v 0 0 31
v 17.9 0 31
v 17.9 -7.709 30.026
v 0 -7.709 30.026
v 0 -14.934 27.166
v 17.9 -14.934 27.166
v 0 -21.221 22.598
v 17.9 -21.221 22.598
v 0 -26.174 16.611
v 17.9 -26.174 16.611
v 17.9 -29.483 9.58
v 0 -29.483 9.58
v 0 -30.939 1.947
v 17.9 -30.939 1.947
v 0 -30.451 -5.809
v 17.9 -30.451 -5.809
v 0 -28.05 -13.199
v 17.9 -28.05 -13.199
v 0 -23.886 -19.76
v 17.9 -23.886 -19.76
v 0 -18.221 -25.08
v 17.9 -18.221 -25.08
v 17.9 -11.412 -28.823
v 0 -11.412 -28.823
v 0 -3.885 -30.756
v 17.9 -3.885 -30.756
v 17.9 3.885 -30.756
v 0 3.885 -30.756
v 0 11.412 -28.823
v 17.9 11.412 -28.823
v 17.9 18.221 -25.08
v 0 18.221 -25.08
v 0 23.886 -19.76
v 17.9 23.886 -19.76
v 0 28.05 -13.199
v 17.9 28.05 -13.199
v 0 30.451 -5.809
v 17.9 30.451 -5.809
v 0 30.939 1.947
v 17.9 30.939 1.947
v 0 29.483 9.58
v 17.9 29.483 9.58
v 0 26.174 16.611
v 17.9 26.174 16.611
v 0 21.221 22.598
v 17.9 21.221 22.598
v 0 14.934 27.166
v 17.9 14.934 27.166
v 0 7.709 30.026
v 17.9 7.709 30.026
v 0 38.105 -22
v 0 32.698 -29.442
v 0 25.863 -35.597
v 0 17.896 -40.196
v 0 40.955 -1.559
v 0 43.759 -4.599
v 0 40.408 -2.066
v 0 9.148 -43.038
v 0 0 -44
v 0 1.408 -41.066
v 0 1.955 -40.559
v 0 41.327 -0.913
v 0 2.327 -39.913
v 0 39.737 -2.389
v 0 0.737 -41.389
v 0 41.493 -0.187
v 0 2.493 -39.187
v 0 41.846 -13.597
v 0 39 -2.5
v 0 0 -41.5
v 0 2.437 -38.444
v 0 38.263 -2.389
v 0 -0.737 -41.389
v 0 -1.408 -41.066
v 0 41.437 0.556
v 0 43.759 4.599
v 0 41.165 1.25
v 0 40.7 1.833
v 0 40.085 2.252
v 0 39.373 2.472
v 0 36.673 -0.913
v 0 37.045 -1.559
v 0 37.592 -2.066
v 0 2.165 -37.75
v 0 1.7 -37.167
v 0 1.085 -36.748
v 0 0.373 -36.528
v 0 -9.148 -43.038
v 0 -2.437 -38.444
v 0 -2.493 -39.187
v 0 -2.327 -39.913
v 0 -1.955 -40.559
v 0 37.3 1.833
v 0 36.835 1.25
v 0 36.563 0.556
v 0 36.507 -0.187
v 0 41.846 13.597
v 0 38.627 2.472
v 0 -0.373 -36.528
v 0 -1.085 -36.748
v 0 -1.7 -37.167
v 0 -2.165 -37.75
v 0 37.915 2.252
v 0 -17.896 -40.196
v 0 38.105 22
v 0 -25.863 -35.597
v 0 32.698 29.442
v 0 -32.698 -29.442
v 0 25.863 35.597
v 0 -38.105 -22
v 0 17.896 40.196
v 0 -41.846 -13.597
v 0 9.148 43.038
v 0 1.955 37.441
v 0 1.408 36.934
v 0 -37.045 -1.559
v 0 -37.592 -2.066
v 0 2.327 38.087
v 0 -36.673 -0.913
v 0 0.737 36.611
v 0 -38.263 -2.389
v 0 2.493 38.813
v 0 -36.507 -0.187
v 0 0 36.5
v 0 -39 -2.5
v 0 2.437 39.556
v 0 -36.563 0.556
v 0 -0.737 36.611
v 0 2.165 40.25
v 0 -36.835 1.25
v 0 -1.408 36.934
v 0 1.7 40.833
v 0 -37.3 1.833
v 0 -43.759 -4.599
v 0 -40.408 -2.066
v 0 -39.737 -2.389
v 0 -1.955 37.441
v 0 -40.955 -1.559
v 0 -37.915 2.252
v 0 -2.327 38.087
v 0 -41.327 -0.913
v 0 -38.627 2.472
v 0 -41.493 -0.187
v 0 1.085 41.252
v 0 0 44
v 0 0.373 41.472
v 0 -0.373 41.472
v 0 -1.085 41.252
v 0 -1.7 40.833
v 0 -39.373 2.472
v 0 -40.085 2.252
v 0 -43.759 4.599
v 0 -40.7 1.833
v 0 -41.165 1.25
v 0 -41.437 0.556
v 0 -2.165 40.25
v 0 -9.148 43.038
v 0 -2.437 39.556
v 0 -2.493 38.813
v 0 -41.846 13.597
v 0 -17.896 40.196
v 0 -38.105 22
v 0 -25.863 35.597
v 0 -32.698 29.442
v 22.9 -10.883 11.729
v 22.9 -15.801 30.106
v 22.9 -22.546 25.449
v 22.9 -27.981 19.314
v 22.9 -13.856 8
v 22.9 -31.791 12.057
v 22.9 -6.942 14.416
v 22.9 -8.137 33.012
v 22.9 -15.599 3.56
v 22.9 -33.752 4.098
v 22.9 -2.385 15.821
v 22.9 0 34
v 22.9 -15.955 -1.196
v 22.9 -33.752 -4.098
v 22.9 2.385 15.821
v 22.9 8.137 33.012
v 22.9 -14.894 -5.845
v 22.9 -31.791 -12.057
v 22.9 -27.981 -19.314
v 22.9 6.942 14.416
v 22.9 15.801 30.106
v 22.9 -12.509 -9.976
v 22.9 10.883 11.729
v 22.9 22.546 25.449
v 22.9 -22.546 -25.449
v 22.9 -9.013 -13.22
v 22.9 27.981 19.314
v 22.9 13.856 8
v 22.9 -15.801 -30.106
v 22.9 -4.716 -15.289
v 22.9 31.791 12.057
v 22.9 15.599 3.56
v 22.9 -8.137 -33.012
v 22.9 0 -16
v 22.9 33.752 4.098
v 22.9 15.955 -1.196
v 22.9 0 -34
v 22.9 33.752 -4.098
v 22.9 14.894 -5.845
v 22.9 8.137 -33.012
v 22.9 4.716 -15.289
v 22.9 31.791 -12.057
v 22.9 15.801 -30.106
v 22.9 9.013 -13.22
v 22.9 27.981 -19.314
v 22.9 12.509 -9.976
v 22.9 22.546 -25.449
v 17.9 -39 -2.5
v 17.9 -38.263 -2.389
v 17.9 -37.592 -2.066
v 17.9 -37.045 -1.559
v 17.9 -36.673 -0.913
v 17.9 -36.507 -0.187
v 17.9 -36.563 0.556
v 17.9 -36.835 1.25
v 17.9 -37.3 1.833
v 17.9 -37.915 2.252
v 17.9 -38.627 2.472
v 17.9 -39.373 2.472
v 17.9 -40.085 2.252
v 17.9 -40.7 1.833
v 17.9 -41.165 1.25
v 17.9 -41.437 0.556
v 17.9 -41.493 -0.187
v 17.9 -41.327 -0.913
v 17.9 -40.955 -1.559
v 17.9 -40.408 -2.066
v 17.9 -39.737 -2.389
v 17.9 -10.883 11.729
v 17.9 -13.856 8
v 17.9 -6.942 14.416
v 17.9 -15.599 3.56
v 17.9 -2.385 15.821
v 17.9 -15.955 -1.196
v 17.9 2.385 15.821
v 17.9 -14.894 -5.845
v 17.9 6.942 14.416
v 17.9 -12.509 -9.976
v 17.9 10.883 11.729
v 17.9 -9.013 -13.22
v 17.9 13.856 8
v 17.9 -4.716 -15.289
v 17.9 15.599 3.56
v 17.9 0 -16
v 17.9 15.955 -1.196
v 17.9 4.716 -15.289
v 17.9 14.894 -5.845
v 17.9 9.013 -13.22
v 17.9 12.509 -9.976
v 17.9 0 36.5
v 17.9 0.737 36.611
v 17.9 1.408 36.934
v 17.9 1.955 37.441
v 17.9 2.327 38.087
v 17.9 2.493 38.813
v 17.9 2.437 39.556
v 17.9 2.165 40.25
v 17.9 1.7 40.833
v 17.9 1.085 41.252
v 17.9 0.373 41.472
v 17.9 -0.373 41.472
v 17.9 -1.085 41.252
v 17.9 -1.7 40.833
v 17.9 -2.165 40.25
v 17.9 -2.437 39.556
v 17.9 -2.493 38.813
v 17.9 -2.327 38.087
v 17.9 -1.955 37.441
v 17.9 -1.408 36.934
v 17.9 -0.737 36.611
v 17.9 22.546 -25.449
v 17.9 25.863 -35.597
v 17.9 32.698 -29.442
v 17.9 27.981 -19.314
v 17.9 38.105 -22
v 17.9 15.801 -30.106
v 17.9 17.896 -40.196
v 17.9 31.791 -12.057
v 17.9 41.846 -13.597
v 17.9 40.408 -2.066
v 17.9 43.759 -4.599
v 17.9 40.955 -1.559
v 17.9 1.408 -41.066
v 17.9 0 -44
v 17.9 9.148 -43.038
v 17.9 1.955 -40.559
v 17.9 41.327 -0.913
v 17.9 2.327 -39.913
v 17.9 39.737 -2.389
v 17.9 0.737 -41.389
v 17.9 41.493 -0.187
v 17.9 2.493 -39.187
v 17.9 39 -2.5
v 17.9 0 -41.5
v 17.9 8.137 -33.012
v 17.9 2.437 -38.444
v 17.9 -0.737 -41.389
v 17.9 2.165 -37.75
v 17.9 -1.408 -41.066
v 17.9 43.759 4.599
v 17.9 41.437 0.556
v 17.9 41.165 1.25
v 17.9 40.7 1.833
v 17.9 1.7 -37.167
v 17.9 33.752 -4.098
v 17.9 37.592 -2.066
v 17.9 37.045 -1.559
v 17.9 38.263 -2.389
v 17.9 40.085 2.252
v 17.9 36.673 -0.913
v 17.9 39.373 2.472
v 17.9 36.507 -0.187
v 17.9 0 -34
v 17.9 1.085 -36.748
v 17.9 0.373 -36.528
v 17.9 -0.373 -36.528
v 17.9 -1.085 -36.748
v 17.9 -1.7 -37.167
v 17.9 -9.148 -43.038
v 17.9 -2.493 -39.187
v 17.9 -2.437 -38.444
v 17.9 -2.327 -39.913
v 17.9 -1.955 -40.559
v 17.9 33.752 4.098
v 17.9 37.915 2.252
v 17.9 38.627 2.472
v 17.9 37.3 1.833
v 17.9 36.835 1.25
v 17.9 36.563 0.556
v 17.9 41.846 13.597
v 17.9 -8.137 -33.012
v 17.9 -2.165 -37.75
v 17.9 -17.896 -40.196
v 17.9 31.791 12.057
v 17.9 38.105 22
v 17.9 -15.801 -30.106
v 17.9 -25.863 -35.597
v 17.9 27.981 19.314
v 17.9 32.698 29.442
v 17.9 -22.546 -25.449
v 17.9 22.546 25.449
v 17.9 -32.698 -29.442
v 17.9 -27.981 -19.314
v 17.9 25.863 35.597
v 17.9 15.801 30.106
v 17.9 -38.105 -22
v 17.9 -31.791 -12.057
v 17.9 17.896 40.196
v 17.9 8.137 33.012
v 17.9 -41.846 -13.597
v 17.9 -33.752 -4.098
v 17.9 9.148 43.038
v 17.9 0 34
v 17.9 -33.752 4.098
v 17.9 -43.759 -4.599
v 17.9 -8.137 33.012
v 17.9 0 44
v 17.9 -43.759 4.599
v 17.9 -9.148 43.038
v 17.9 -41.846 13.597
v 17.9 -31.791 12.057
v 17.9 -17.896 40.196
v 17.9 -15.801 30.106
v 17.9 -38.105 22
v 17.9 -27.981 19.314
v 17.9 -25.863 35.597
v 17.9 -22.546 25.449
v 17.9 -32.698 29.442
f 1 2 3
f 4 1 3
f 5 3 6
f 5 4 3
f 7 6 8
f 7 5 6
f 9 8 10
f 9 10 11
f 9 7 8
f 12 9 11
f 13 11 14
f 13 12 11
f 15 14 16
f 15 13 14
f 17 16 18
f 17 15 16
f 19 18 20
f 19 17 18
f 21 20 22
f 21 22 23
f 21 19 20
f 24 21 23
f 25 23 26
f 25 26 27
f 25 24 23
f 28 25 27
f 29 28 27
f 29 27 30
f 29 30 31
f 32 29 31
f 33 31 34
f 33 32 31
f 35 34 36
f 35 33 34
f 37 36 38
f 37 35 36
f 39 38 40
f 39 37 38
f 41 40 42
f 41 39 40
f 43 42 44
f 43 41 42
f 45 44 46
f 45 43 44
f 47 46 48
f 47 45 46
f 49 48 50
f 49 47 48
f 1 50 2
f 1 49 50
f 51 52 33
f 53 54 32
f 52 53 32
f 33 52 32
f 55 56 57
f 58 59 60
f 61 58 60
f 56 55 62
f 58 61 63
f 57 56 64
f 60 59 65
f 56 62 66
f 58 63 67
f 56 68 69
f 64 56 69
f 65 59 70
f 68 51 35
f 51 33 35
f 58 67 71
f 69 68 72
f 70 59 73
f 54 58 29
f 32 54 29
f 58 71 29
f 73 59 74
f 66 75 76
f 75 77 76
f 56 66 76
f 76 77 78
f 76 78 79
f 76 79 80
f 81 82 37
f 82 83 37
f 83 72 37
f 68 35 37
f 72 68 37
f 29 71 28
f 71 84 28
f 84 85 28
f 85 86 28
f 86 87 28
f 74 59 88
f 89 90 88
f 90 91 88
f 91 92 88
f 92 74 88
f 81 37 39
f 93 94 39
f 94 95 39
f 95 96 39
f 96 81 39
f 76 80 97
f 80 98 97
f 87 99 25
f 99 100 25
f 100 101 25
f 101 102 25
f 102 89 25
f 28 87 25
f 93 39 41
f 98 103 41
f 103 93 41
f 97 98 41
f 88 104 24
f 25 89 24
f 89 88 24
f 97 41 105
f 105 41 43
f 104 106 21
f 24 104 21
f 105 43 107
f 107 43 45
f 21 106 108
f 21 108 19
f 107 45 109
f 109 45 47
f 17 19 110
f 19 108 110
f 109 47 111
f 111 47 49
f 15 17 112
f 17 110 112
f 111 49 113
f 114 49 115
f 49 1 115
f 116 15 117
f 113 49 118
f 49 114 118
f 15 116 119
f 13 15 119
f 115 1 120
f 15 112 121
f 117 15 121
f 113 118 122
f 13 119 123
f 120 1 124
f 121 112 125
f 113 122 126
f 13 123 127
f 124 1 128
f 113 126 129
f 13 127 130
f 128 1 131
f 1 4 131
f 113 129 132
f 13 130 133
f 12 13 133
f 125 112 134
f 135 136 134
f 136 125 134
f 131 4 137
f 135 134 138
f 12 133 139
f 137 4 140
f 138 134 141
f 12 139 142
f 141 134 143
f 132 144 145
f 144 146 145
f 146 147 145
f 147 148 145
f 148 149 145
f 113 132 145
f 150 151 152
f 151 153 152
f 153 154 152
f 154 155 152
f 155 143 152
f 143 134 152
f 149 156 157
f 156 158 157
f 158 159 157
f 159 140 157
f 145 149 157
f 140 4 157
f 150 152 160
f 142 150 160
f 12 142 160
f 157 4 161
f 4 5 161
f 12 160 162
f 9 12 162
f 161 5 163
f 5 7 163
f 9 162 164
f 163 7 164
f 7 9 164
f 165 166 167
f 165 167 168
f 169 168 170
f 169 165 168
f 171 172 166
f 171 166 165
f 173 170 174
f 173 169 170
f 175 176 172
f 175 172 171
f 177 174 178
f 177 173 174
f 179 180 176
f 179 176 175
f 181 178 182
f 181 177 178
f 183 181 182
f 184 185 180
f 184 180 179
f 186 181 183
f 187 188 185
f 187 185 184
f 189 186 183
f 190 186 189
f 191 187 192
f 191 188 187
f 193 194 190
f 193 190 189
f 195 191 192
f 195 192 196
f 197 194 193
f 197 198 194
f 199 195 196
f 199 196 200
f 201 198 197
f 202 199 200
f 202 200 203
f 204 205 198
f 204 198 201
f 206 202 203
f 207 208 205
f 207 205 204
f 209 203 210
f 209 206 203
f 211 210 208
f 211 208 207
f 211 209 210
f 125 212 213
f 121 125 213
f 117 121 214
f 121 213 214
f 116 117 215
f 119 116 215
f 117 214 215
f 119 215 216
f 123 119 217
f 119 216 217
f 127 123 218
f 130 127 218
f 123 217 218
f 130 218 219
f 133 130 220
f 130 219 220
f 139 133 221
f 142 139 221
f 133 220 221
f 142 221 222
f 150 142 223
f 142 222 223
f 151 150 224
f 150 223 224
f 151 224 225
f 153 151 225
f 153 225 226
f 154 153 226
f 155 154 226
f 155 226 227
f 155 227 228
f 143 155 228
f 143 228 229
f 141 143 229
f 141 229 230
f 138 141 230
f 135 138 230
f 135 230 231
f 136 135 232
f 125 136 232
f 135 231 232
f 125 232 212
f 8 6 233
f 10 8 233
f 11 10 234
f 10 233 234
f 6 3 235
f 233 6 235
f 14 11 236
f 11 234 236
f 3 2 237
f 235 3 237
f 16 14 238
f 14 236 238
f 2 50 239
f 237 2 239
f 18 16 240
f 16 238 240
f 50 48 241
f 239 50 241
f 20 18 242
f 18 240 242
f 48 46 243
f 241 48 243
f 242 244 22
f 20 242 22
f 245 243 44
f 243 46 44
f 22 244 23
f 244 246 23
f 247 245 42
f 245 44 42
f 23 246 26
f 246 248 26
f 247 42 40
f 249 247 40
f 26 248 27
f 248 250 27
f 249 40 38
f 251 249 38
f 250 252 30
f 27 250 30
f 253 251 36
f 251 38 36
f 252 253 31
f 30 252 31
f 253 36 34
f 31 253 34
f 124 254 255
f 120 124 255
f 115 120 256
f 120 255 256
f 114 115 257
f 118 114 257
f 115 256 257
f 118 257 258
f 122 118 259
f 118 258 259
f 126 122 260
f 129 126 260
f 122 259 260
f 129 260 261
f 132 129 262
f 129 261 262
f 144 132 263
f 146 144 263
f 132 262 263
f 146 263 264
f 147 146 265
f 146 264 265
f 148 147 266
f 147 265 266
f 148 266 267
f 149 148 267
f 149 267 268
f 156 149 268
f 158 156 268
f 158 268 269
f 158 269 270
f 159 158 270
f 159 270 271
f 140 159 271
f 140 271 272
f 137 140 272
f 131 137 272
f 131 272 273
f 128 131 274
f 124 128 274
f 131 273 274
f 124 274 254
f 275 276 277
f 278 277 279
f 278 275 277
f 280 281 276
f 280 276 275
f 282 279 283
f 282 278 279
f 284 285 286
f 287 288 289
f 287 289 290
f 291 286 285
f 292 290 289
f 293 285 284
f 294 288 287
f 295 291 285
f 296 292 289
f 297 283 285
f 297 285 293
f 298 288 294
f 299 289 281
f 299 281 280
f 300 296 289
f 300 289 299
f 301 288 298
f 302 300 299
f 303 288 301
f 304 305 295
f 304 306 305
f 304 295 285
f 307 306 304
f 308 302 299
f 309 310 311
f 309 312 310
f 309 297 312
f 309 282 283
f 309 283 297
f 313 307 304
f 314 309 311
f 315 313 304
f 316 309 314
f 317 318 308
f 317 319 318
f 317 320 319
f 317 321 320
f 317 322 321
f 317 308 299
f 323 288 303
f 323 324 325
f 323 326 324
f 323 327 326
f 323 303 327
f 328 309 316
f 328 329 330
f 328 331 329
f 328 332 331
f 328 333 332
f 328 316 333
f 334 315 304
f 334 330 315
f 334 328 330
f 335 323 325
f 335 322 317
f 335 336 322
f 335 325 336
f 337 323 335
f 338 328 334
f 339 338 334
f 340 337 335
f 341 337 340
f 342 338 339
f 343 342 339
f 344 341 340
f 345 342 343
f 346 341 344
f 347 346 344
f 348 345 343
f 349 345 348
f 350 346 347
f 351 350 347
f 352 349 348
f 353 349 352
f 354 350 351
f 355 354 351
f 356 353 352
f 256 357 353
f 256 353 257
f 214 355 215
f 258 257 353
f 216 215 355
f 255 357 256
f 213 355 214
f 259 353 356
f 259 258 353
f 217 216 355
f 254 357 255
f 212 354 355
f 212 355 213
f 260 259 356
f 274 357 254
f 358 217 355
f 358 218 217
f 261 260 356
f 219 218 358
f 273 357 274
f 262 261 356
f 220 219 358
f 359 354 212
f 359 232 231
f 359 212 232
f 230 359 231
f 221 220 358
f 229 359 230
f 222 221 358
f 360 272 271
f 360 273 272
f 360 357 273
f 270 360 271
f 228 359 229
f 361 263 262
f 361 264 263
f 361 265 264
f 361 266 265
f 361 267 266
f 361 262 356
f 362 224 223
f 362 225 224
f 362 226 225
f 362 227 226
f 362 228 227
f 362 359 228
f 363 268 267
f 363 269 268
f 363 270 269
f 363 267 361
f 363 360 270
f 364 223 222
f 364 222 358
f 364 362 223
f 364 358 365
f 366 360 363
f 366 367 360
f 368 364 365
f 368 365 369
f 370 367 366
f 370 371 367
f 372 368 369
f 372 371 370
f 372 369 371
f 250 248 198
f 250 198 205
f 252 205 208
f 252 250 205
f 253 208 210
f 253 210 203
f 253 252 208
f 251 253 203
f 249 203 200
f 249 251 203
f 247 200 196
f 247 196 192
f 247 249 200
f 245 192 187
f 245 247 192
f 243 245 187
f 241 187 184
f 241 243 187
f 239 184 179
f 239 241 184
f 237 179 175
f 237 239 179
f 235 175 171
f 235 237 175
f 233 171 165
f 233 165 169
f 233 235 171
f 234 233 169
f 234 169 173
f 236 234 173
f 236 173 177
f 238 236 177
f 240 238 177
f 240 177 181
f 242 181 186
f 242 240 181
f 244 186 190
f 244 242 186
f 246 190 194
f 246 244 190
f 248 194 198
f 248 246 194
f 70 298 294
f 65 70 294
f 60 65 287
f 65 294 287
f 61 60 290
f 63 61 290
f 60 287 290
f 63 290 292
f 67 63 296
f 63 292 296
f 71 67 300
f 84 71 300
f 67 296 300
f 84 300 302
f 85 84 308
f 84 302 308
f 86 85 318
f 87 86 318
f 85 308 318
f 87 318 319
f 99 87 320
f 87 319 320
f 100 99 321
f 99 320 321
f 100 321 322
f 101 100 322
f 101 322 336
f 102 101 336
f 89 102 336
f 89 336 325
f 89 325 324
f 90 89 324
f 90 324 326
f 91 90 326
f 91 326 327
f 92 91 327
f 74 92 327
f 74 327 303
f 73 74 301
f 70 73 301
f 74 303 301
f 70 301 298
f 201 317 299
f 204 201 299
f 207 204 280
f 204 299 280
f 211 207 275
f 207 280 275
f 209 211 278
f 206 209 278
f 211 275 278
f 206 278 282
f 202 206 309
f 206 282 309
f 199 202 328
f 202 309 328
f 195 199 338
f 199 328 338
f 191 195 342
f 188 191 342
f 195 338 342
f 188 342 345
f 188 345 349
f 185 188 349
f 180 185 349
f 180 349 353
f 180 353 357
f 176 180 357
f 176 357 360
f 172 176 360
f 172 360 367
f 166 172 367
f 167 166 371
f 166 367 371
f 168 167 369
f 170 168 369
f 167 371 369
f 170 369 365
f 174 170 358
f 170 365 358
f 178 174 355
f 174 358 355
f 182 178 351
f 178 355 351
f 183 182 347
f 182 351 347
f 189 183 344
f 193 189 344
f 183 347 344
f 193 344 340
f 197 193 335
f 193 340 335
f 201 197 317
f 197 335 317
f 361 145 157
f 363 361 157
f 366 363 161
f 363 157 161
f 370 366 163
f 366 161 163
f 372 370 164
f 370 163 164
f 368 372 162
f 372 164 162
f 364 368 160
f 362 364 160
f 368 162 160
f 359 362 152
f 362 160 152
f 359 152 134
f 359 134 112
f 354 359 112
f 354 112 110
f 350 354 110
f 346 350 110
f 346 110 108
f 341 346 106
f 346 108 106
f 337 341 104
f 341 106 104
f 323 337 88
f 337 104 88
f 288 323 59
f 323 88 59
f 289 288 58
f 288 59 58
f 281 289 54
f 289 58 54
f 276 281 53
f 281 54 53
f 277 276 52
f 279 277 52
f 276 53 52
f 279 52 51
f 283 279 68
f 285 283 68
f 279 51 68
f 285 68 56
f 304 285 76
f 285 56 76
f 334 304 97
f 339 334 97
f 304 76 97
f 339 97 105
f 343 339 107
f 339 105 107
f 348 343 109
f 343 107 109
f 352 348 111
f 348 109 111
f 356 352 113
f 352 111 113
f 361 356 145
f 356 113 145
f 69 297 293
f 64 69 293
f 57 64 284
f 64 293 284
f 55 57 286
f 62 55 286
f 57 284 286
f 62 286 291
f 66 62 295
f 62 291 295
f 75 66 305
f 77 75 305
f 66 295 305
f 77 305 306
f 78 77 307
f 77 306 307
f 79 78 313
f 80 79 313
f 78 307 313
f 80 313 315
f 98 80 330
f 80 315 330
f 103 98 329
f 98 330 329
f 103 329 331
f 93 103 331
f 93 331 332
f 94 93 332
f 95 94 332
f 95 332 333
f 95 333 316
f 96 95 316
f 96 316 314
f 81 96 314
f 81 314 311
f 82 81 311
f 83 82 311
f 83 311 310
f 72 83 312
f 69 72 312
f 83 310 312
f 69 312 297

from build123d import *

# Parameters (mm, degrees)
SKETCH_1_R          = 44
SKETCH_1_R_2        = 31
EXTRUDE_1_DEPTH     = 17.9
SKETCH_2_R          = 2.5
CUT_EXTRUDE_1_DEPTH = 17.9
SKETCH_3_R          = 34
SKETCH_3_R_2        = 16
EXTRUDE_2_DEPTH     = 5


with BuildPart() as part:
    # 草图1 → 凸台-拉伸1 (new body)
    with BuildSketch(Plane(origin=(0, 0, 0), x_dir=(0, 0, -1), z_dir=(1, 0, 0))):
        with Locations(Location((0, 0, 0), (0, 0, 180))):
            Circle(SKETCH_1_R)
        with Locations(Location((0, 0, 0), (0, 0, 180))):
            Circle(SKETCH_1_R_2, mode=Mode.SUBTRACT)
    extrude(amount=EXTRUDE_1_DEPTH)

    # 草图2 → 切除-拉伸1 (cut)
    with BuildSketch(Plane(origin=(17.9, 0, 0), x_dir=(0, 0, -1), z_dir=(1, 0, 0))):
        with Locations((0, 39)):
            Circle(SKETCH_2_R)
        with Locations((39, 0)):
            Circle(SKETCH_2_R)
        with Locations((0, -39)):
            Circle(SKETCH_2_R)
        with Locations((-39, 0)):
            Circle(SKETCH_2_R)
    extrude(amount=-CUT_EXTRUDE_1_DEPTH, mode=Mode.SUBTRACT)

    # 草图3 → 凸台-拉伸2 (add)
    with BuildSketch(Plane(origin=(17.9, 0, 0), x_dir=(0, 0, -1), z_dir=(1, 0, 0))):
        Circle(SKETCH_3_R)
        Circle(SKETCH_3_R_2, mode=Mode.SUBTRACT)
    extrude(amount=EXTRUDE_2_DEPTH)


solid = part.part
